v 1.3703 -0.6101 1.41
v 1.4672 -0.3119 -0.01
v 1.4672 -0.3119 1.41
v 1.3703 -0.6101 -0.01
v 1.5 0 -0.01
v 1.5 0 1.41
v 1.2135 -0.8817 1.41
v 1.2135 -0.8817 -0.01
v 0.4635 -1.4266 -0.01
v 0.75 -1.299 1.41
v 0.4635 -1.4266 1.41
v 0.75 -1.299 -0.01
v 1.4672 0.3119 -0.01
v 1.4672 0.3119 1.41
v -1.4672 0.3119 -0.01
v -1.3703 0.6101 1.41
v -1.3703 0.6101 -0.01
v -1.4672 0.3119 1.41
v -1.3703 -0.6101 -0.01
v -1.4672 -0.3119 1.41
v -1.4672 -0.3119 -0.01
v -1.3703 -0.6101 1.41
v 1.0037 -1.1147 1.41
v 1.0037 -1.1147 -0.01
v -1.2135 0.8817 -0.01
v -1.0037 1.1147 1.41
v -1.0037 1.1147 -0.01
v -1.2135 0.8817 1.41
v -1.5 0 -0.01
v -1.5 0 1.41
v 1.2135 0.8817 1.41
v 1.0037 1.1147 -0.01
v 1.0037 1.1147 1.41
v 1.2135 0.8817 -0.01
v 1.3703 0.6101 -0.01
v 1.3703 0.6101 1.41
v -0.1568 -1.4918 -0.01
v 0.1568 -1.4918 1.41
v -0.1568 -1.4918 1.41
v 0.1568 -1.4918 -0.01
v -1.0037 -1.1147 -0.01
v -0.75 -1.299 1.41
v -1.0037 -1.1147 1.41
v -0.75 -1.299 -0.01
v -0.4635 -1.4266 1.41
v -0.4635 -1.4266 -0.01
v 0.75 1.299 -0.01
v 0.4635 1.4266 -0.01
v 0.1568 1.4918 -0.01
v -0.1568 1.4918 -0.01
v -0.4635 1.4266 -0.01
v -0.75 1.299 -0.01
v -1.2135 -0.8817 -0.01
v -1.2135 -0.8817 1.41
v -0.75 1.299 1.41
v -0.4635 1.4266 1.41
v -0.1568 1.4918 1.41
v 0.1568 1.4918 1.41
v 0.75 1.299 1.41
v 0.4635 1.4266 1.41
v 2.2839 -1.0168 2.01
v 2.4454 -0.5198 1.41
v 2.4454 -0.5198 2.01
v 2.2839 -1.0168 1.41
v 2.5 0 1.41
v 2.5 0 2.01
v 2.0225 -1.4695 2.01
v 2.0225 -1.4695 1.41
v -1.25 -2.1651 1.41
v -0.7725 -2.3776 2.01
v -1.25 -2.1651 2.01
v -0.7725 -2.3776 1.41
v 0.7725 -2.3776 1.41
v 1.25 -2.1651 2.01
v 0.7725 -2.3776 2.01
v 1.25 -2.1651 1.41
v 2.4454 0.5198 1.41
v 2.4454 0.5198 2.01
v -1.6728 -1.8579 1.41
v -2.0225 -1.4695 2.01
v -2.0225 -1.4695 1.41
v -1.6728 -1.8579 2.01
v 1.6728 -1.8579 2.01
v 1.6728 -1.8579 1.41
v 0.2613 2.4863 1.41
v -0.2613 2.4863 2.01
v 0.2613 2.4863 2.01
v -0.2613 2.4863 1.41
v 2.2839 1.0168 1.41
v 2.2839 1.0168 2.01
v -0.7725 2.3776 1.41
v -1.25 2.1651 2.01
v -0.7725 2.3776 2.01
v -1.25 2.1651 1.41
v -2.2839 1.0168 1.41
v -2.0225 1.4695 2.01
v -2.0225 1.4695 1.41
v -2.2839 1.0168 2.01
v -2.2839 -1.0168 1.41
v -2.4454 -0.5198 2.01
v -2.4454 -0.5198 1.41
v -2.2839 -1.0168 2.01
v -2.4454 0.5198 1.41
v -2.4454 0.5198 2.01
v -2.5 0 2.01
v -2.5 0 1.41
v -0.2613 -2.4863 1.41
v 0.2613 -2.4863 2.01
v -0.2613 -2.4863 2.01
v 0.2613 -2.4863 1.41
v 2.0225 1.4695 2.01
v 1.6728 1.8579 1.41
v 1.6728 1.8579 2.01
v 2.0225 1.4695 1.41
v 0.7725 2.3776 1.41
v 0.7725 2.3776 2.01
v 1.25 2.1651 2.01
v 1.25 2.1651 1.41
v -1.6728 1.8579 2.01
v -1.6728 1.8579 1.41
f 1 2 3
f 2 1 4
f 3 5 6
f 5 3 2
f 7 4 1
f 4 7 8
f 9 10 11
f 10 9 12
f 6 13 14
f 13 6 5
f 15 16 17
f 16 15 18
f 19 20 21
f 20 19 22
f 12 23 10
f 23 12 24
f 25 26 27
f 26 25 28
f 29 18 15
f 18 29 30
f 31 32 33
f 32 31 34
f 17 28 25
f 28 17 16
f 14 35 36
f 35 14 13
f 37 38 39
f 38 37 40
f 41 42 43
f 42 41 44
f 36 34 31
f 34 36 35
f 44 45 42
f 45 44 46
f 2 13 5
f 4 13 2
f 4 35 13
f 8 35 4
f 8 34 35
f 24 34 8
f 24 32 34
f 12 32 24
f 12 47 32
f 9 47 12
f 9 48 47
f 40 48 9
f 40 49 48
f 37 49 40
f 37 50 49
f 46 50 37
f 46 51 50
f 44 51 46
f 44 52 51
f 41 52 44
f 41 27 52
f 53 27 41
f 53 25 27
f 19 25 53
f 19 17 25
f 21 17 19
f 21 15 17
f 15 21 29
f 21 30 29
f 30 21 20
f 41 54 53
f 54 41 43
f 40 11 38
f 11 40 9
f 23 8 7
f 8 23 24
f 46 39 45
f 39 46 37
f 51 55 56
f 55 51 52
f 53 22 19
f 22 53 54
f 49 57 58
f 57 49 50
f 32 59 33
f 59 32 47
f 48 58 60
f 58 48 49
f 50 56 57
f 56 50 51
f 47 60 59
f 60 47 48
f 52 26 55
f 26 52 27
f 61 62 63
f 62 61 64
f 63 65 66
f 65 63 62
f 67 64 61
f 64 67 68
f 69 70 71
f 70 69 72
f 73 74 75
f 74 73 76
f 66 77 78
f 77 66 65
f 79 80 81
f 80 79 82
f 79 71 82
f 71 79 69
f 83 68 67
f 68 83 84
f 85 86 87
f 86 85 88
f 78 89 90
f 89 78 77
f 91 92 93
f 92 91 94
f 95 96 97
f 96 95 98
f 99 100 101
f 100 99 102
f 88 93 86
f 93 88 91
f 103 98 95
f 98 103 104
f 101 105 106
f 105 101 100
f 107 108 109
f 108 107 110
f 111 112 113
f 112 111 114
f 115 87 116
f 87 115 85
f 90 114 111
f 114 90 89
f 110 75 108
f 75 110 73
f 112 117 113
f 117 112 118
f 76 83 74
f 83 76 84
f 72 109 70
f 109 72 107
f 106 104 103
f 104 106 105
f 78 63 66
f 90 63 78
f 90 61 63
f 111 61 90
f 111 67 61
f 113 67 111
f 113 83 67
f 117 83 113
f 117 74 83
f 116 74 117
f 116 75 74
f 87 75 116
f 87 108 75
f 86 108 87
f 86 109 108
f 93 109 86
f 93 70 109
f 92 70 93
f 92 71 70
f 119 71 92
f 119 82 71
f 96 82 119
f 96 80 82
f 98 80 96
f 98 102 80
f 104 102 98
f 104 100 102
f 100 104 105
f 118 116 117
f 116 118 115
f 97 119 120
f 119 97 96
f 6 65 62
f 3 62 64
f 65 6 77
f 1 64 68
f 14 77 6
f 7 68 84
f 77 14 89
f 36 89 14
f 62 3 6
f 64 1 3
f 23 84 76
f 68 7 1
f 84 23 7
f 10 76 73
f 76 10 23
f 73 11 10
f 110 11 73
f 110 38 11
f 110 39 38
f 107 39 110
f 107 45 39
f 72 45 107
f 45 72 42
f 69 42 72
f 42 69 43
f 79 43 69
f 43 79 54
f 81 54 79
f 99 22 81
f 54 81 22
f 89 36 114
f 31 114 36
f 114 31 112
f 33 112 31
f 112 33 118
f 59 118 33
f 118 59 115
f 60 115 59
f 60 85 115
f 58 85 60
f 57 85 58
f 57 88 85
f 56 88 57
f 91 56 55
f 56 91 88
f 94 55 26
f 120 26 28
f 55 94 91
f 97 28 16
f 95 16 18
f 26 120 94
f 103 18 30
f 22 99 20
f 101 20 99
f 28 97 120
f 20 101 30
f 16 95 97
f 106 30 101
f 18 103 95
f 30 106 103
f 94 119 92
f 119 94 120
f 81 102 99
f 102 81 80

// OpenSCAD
// file: constants.scad
include <MCAD/units.scad>

screwTightDiameter = 2*mm;
screwLooseHeadDiameter = 5*mm;
screwLooseShaftDiameter = 3*mm;

screwHeadHeight = 1.5*mm; //I'm worried that this should actually be more like 2mm

holepunch = 6.5*mm;// Was 5mm, but that was too small
// main file
include <constants.scad>

module tinyMount(
	axleLen = 2, 
	screwHole = false, 
	sparse = true, 
	base = true){

	thickness = .6;
	paper = 0.4;
	holepunch = 5;//mm
	r = 10;

	difference(){
		union(){
			cylinder(h=thickness + paper, d=holepunch, $fn=60);
			translate([0,0,thickness+paper]) cylinder(h=axleLen, d=axleD, $fn=60);

			l = [[r, 0], [0, r], [-r, 0], [0, -r]];


			if(base)
			{	curveRadius = 1;
				if(!sparse){
					hull()
					for (x1 = l){
						translate(x1) cylinder(h=thickness, r=curveRadius, center=false, $fn=20);
					}
				}
				else{
					for (x1 = l){
						for (x2 = l){
							hull(){
								translate(x1) cylinder(h=thickness, r=curveRadius, center=false, $fn=20);
								translate(x2) cylinder(h=thickness, r=curveRadius, center=false, $fn=20);
							}
						}
					}
				}
			}
		}
		if (screwHole) {
			cylinder(h=1000, d = screwTightDiameter, center=true, $fn=20);
		}
	}
}

module testTinyMount() {
	tinyMount(screwHole = false);
	translate([14,14]) tinyMount(screwHole = true);
	translate([-14,-14]) tinyMount(screwHole = true, sparse=false);
}
rotate([0,0,45]) testTinyMount();

module paperMount(){
	width = 8;
	height = .6;
	taperdeg = 20;

	translate([0,0,-height])
	difference(){
		cylinder(h=height, d1=width, d2 = width - 2 * height * cos(taperdeg), center=false); 
		//Marker for center
		translate([0,0,height/2]) cylinder(h=height, d=.2);
		//Indent for pin
		translate([0,0,height-.2]) pinHole();
	}
}

axleD = 3;

clipHeight = .8;
clipRadius = 1.5;

module separatePin(axleLen = 2){
	rotate([180]) translate([0,0,-axleLen]){
		cylinder(h=axleLen, d=axleD);
		cylinder(h=clipHeight, d=axleD+2*clipRadius);
	}
}

module pinHole(axleLen = 2){
	rotate([180]) translate([0,0,-axleLen]){
		cylinder(h=axleLen + .01, d=axleD + 2*wiggle);
		translate([0,0,-.01]) cylinder(h=clipHeight + wiggle+.01, d=axleD+2*clipRadius + 2*wiggle);
	}
}

module screwHole(axleLen = 2, head=0.4){
	rotate([180]) translate([0,0,-axleLen]){
		cylinder(h=axleLen + .01, d=screwLooseShaftDiameter);
		if(head){
			translate([0,0,-.01]) cylinder(h=screwHeadHeight*head, d=screwLooseHeadDiameter);
		}
	}
}

!screwHole();

wiggle = .3;



$fs = .1;

*color("lightgreen") {
	//	pivot(2);
	paperMount();
}
*color("lightgreen") translate([13,0]) {
	//	pivot(1);
	paperMount(axleLen=1);
}

*rotate([180]){
	separatePin();
	//	#pinHole();
}

// module peg(axleLen){ //peg, including clip
	// 	cylinder(d = axleD, h = axleLen);
	
	// 	clipHeight = .3;
	// 	clipRadius = .5;
	// 	translate([0,0,axleLen]) 
	// 	cylinder(h=clipHeight, d1=clipOuterD, d2=axleD);

	// 	clipOuterD = axleD+2*clipRadius;

	// 	printangle = 60;

	// 	translate([0,0,axleLen]) mirror([0,0,1]) cylinder(d1 = clipOuterD ,d2 = axleD, h = cos(printangle) * (clipOuterD - axleD));
	// }

	// module pivot(axleLen = 3){
		// 	difference(){ //Peg with slot
			// 		peg(axleLen);

			// 		sliceWidth = 2;
			// 		cube([100, sliceWidth, 100], center = true);
			// 	}
			// }
